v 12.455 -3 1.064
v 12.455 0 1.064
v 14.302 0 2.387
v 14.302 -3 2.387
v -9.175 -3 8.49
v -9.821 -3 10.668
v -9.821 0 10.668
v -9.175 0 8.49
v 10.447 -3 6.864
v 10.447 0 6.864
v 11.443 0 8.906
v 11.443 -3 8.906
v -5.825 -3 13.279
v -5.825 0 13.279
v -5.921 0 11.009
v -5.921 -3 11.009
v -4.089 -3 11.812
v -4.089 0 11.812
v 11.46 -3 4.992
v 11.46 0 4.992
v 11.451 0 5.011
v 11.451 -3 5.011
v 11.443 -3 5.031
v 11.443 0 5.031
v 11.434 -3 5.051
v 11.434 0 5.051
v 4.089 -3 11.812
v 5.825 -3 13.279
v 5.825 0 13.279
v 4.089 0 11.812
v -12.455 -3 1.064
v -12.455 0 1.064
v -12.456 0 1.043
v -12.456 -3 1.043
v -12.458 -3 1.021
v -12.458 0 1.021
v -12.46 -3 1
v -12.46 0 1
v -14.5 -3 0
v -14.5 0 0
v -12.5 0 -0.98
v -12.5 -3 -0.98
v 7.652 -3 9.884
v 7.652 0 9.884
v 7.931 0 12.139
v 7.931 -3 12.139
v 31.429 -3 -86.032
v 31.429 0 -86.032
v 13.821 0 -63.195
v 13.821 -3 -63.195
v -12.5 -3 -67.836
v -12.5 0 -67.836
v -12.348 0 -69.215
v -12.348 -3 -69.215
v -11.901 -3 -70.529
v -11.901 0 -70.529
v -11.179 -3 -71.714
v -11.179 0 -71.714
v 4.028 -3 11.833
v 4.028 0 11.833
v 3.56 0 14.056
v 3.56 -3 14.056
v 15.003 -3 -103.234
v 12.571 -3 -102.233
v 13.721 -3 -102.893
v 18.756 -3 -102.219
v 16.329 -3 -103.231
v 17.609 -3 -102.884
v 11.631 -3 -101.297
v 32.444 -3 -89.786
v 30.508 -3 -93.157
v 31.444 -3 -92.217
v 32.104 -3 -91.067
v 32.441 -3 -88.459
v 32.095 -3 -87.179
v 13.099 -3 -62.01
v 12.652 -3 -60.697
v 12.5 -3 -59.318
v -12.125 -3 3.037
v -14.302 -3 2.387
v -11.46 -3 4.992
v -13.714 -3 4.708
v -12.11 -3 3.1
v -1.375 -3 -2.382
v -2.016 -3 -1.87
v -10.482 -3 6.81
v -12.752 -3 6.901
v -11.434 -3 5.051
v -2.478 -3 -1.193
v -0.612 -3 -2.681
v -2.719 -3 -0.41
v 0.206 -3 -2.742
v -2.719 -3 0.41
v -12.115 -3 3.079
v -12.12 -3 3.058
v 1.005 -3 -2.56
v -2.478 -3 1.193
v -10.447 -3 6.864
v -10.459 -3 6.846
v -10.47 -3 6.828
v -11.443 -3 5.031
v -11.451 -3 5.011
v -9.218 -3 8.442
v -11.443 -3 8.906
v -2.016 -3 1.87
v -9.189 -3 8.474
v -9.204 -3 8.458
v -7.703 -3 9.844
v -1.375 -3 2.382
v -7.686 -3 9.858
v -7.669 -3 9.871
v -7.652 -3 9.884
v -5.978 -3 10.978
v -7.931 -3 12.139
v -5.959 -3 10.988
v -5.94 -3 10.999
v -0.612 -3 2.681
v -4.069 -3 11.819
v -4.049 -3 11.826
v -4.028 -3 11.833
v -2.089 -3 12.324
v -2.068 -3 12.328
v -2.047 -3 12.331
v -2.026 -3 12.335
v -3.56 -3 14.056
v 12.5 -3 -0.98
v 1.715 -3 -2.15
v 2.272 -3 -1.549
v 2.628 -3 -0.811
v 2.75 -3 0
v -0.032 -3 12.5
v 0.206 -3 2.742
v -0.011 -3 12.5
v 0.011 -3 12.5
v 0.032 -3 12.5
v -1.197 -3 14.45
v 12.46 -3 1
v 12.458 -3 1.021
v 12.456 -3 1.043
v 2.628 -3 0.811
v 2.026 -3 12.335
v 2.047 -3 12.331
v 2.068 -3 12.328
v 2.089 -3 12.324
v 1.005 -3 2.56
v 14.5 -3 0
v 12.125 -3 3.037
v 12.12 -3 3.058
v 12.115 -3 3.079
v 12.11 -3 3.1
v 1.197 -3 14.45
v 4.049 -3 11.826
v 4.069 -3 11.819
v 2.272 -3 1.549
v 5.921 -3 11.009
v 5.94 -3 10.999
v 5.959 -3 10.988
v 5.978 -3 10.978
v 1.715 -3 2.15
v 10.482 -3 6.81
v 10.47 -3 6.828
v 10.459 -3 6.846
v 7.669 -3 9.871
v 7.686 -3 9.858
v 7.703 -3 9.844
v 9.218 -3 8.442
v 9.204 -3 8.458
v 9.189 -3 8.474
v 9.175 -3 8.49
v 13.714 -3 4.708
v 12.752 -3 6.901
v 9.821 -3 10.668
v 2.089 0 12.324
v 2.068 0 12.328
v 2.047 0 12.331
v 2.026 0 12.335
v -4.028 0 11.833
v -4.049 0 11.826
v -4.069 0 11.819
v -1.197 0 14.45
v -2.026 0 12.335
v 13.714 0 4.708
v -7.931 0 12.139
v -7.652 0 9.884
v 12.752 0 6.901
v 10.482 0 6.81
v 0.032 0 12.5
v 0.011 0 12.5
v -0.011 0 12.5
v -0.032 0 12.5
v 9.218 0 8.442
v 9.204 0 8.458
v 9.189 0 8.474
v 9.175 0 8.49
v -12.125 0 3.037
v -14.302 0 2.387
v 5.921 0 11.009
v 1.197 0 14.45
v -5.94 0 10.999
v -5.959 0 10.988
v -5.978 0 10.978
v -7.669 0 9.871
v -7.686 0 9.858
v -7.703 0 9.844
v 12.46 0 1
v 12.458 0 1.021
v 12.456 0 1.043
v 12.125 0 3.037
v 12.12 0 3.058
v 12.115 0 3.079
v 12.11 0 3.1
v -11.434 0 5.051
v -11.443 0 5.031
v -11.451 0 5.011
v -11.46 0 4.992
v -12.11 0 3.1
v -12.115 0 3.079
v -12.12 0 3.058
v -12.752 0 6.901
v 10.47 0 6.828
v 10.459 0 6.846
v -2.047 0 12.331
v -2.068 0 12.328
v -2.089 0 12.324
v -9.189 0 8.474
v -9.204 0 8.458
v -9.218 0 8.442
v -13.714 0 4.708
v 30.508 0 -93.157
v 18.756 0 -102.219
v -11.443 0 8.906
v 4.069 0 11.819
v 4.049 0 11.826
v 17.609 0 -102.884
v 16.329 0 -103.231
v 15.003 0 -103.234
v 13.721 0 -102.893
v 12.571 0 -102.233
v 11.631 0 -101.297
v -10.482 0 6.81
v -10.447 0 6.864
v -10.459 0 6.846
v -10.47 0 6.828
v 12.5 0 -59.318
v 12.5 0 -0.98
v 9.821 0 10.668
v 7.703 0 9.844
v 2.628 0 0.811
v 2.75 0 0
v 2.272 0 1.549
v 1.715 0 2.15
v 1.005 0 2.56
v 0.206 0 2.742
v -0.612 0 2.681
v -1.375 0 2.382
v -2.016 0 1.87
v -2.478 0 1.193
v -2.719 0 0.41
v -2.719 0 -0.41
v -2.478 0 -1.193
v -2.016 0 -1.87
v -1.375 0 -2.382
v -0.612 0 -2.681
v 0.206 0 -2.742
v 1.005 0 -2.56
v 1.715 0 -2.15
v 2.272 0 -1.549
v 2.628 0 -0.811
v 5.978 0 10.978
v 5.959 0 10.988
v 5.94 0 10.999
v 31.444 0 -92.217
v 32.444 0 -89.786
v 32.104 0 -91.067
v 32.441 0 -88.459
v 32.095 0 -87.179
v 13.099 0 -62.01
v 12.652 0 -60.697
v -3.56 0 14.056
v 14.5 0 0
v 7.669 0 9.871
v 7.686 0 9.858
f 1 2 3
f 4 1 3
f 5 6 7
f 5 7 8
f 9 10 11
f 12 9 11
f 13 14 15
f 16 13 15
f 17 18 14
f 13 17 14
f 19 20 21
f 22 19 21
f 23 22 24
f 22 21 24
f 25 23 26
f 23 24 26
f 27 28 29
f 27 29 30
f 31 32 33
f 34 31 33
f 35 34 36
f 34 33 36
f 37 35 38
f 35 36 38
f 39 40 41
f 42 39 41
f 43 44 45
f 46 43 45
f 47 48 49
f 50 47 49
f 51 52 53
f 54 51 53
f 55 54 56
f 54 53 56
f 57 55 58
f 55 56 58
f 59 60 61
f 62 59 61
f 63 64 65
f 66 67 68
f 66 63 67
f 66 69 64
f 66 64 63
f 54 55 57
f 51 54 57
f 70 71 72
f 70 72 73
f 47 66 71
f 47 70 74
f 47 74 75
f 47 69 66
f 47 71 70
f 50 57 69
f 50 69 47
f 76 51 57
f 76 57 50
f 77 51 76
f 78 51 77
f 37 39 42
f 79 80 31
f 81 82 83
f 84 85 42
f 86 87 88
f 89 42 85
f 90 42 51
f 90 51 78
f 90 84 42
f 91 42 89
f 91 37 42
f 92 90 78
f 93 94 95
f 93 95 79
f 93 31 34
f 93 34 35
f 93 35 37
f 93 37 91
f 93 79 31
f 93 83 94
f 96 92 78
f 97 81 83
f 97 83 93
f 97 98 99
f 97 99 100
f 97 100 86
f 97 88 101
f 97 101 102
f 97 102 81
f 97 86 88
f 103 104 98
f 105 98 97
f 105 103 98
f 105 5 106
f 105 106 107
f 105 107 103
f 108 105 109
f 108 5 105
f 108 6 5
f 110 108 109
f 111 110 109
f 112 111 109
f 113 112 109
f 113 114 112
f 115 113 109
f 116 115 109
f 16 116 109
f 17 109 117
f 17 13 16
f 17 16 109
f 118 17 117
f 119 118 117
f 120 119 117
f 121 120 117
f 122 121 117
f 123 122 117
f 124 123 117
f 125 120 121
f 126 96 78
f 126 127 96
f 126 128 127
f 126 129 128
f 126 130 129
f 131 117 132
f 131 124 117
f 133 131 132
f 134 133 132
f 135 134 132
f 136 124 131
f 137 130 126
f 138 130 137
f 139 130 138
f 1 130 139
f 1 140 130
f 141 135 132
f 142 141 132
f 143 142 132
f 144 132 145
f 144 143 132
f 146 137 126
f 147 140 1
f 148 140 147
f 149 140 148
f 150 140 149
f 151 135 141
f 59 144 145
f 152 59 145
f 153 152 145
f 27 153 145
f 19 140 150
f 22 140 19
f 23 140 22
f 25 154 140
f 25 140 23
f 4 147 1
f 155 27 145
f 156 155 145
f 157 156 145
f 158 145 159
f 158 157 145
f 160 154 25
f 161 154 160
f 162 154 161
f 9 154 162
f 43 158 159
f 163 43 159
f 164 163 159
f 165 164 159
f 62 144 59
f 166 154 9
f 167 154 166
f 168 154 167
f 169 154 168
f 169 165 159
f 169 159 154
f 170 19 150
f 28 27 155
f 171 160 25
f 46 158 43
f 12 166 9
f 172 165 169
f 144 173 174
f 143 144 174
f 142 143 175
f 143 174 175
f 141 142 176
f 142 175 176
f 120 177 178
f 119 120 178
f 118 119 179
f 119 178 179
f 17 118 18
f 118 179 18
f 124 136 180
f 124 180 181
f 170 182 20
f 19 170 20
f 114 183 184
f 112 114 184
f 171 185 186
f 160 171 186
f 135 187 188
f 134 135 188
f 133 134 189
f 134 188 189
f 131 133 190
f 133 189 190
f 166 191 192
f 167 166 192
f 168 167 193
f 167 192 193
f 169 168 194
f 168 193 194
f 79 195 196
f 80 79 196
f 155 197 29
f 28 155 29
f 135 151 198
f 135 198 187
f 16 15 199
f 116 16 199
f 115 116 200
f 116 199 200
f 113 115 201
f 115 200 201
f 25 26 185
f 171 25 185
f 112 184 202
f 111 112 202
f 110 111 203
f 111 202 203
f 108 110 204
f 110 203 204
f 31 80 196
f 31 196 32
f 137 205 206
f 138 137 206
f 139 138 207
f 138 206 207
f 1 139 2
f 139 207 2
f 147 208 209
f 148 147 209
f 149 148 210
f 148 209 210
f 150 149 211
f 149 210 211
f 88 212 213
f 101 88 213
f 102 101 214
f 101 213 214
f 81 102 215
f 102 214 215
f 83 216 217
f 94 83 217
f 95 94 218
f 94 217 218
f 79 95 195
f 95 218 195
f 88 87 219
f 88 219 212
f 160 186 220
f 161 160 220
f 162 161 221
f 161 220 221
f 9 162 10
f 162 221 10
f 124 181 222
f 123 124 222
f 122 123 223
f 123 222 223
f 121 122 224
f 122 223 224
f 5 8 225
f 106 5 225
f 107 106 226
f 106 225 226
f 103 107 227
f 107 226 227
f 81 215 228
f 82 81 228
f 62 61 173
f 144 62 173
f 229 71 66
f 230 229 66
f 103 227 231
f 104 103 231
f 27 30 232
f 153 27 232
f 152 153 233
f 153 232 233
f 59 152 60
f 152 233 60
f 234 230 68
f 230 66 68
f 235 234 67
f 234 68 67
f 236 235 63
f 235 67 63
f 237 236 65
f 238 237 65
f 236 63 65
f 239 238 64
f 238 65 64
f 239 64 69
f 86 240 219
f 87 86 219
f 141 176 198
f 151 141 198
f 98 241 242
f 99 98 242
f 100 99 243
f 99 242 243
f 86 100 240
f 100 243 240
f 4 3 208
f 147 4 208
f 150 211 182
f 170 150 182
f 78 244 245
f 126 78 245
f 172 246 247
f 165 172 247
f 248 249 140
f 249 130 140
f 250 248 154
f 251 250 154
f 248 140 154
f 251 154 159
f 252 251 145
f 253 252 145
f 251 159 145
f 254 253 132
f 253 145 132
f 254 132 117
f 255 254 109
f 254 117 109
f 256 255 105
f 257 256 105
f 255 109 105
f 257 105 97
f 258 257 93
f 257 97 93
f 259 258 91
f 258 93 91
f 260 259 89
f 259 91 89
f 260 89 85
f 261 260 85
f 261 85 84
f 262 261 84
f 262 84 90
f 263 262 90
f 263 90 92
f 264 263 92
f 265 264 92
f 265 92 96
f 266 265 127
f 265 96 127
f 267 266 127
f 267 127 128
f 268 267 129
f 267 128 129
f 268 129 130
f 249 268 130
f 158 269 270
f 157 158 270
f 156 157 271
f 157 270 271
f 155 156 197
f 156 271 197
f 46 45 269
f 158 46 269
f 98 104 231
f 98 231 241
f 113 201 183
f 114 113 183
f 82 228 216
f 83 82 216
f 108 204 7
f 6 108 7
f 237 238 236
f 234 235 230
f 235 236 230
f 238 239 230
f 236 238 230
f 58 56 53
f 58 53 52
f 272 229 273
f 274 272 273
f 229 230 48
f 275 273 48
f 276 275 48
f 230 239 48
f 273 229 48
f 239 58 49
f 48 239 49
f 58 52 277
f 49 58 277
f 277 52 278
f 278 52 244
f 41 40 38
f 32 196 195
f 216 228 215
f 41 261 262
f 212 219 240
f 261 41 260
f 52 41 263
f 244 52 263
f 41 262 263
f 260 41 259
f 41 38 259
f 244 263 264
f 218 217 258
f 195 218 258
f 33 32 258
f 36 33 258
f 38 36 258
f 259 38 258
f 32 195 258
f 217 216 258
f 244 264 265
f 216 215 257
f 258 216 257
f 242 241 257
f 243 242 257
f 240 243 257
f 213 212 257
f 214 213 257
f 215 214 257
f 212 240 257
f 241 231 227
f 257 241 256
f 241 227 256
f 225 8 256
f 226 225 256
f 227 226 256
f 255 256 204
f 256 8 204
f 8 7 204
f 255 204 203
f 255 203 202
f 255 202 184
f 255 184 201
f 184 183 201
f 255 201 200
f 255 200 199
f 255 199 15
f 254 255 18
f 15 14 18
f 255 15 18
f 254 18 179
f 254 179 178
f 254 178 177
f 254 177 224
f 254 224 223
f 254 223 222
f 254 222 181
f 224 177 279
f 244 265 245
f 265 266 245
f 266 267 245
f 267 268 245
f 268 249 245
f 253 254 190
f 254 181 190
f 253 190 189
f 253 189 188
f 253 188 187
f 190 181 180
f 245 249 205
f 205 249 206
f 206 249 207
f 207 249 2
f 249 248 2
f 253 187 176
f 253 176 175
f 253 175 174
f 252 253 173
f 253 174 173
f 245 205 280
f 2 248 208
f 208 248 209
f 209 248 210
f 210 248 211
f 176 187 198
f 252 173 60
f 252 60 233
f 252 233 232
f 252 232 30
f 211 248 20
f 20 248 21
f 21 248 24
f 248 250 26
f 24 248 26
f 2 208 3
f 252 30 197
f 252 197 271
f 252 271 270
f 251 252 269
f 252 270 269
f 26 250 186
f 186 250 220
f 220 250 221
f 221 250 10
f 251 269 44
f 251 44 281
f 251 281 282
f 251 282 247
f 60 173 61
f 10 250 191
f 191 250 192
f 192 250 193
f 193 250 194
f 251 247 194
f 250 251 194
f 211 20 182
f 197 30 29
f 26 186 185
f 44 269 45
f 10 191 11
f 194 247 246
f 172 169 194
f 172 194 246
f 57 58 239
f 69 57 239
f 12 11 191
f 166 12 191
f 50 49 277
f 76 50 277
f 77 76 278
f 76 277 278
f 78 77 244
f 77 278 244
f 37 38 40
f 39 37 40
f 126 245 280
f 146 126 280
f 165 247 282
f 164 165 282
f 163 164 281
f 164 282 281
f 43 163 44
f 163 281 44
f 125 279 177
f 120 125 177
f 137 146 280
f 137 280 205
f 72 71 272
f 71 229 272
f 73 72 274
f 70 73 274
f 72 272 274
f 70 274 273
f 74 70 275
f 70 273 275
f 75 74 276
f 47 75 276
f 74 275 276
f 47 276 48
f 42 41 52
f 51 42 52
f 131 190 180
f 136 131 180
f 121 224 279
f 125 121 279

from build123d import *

# Parameters (mm, degrees)
F0_R     = 1.5
F1_DEPTH = 3
F3_R     = 2.75
F4_DEPTH = 381
F6_DEPTH = 381
F7_R     = 5.08
F8_R     = 5.08


with BuildPart() as f1:
    # F0 (on Front) → F1 (new body)
    with BuildSketch(Plane.XZ):
        with BuildLine():
            ThreePointArc((12.4599357944, -1), (12.4899799325, -0.5004011242), (12.5, 0))
            ThreePointArc((12.5, 0), (12.4899799325, 0.5004011242), (12.4599357944, 1))
            Line((12.4599357944, 1), (12.4599357944, -1))
        make_face()
        with BuildLine():
            Line((12.5, -0.9803613016), (12.5, 0))
            ThreePointArc((12.5, 0), (12.4899799325, -0.5004011242), (12.4599357944, -1))
            Line((12.4599357944, -1), (12.5, -0.9803613016))
        make_face()
        Polygon((14.5, 0), (12.5, 0), (12.5, -0.9803613016), align=None)
        with BuildLine():
            ThreePointArc((12.4599357944, 1), (12.4899799325, 0.5004011242), (12.5, 0))
            Line((12.5, 0), (14.5, 0))
            Line((14.5, 0), (12.4599357944, 1))
        make_face()
        with BuildLine():
            Line((12.4599357944, -1), (12.4599357944, 1))
            ThreePointArc((12.4599357944, 1), (12.4573061626, 1.0322418184), (12.4545931007, 1.0644767236))
            Line((12.4545931007, 1.0644767236), (12.1254039202, 3.0371993304))
            ThreePointArc((12.1254039202, 3.0371993304), (12.1175033242, 3.0685685893), (12.109521574, 3.0999172971))
            Line((12.109521574, 3.0999172971), (11.4601226356, 4.9915517805))
            ThreePointArc((11.4601226356, 4.9915517805), (11.4471665832, 5.0211928082), (11.4341338659, 5.0508002075))
            Line((11.4341338659, 5.0508002075), (10.4822390798, 6.8097477099))
            ThreePointArc((10.4822390798, 6.8097477099), (10.4645809783, 6.8368519765), (10.4468527925, 6.8639104548))
            Line((10.4468527925, 6.8639104548), (9.2184273671, 8.4421914736))
            ThreePointArc((9.2184273671, 8.4421914736), (9.1965488834, 8.4660196453), (9.1746088078, 8.4897911177))
            Line((9.1746088078, 8.4897911177), (7.7031609865, 9.844354261))
            ThreePointArc((7.7031609865, 9.844354261), (7.6776589086, 9.8642563675), (7.6521054113, 9.8840924102))
            Line((7.6521054113, 9.8840924102), (5.9777724548, 10.9779887265))
            ThreePointArc((5.9777724548, 10.9779887265), (5.949342413, 10.9934218901), (5.9208725267, 11.0087814277))
            Line((5.9208725267, 11.0087814277), (4.0893258734, 11.812172277))
            ThreePointArc((4.0893258734, 11.812172277), (4.0587433651, 11.8227155213), (4.0281336742, 11.8331795855))
            Line((4.0281336742, 11.8331795855), (2.0893331423, 12.3241505598))
            ThreePointArc((2.0893331423, 12.3241505598), (2.0574323785, 12.3295162925), (2.0255178355, 12.3347994511))
            Line((2.0255178355, 12.3347994511), (0.0323488495, 12.499958142))
            ThreePointArc((0.0323488495, 12.499958142), (0, 12.5), (-0.0323488495, 12.499958142))
            Line((-0.0323488495, 12.499958142), (-2.0255178355, 12.3347994511))
            ThreePointArc((-2.0255178355, 12.3347994511), (-2.0574323785, 12.3295162925), (-2.0893331423, 12.3241505598))
            Line((-2.0893331423, 12.3241505598), (-4.0281336742, 11.8331795855))
            ThreePointArc((-4.0281336742, 11.8331795855), (-4.0587433651, 11.8227155213), (-4.0893258734, 11.812172277))
            Line((-4.0893258734, 11.812172277), (-5.9208725267, 11.0087814277))
            ThreePointArc((-5.9208725267, 11.0087814277), (-5.949342413, 10.9934218901), (-5.9777724548, 10.9779887265))
            Line((-5.9777724548, 10.9779887265), (-7.6521054113, 9.8840924102))
            ThreePointArc((-7.6521054113, 9.8840924102), (-7.6776589086, 9.8642563675), (-7.7031609865, 9.844354261))
            Line((-7.7031609865, 9.844354261), (-9.1746088078, 8.4897911177))
            ThreePointArc((-9.1746088078, 8.4897911177), (-9.1965488834, 8.4660196453), (-9.2184273671, 8.4421914736))
            Line((-9.2184273671, 8.4421914736), (-10.4468527925, 6.8639104548))
            ThreePointArc((-10.4468527925, 6.8639104548), (-10.4645809783, 6.8368519765), (-10.4822390798, 6.8097477099))
            Line((-10.4822390798, 6.8097477099), (-11.4341338659, 5.0508002075))
            ThreePointArc((-11.4341338659, 5.0508002075), (-11.4471665832, 5.0211928082), (-11.4601226356, 4.9915517805))
            Line((-11.4601226356, 4.9915517805), (-12.109521574, 3.0999172971))
            ThreePointArc((-12.109521574, 3.0999172971), (-12.1175033242, 3.0685685893), (-12.1254039202, 3.0371993304))
            Line((-12.1254039202, 3.0371993304), (-12.4545931007, 1.0644767236))
            ThreePointArc((-12.4545931007, 1.0644767236), (-12.4573061626, 1.0322418184), (-12.4599357944, 1))
            Line((-12.4599357944, 1), (-12.4599357944, -1))
            ThreePointArc((-12.4599357944, -1), (0, -12.5), (12.4599357944, -1))
        make_face()
        Circle(F0_R, mode=Mode.SUBTRACT)
        with BuildLine():
            Line((12.5, -0.9803613016), (12.4599357944, -1))
            ThreePointArc((12.4599357944, -1), (0, -12.5), (-12.4599357944, -1))
            Line((-12.4599357944, -1), (-12.5, -0.9803613016))
            Line((-12.5, -0.9803613016), (-12.5, -67.8362422814))
            ThreePointArc((-12.5, -67.8362422814), (-12.1606330639, -69.8843609721), (-11.1788062454, -71.7135619415))
            Line((-11.1788062454, -71.7135619415), (26.3647868293, -120.4068531523))
            ThreePointArc((26.3647868293, -120.4068531523), (30.5793691017, -122.827115514), (35.2709127347, -121.5583397375))
            Line((35.2709127347, -121.5583397375), (45.0117500289, -114.0479410258))
            ThreePointArc((45.0117500289, -114.0479410258), (47.4320123906, -109.8333587534), (46.1632366141, -105.1418151204))
            Line((46.1632366141, -105.1418151204), (13.8211937546, -63.194830766))
            ThreePointArc((13.8211937546, -63.194830766), (12.8393669361, -61.3656297965), (12.5, -59.3175111059))
            Line((12.5, -59.3175111059), (12.5, -0.9803613016))
        make_face()
        with BuildLine():
            Line((12.1254039202, 3.0371993304), (12.4545931007, 1.0644767236))
            ThreePointArc((12.4545931007, 1.0644767236), (12.4019962037, 1.5622068245), (12.3295162925, 2.0574323785))
            ThreePointArc((12.3295162925, 2.0574323785), (12.2372695677, 2.5493594347), (12.1254039202, 3.0371993304))
        make_face()
        with BuildLine():
            ThreePointArc((12.3295162925, 2.0574323785), (12.4019962037, 1.5622068245), (12.4545931007, 1.0644767236))
            Line((12.4545931007, 1.0644767236), (14.3022388993, 2.3866215591))
            Line((14.3022388993, 2.3866215591), (12.3295162925, 2.0574323785))
        make_face()
        with BuildLine():
            Line((-12.5, -0.9803613016), (-12.4599357944, -1))
            ThreePointArc((-12.4599357944, -1), (-12.4899799325, -0.5004011242), (-12.5, 0))
            Line((-12.5, 0), (-12.5, -0.9803613016))
        make_face()
        with BuildLine():
            ThreePointArc((-12.5, 0), (-12.4899799325, -0.5004011242), (-12.4599357944, -1))
            Line((-12.4599357944, -1), (-12.4599357944, 1))
            ThreePointArc((-12.4599357944, 1), (-12.4899799325, 0.5004011242), (-12.5, 0))
        make_face()
        with BuildLine():
            ThreePointArc((12.1254039202, 3.0371993304), (12.2372695677, 2.5493594347), (12.3295162925, 2.0574323785))
            Line((12.3295162925, 2.0574323785), (14.3022388993, 2.3866215591))
            Line((14.3022388993, 2.3866215591), (12.1254039202, 3.0371993304))
        make_face()
        with BuildLine():
            Line((-14.5, 0), (-12.5, 0))
            ThreePointArc((-12.5, 0), (-12.4899799325, 0.5004011242), (-12.4599357944, 1))
            Line((-12.4599357944, 1), (-14.5, 0))
        make_face()
        Polygon((-12.5, -0.9803613016), (-12.5, 0), (-14.5, 0), align=None)
        with BuildLine():
            Line((11.4601226356, 4.9915517805), (12.109521574, 3.0999172971))
            ThreePointArc((12.109521574, 3.0999172971), (11.9757183481, 3.5822018434), (11.8227155213, 4.0587433651))
            ThreePointArc((11.8227155213, 4.0587433651), (11.6507583892, 4.5287778655), (11.4601226356, 4.9915517805))
        make_face()
        with BuildLine():
            ThreePointArc((11.8227155213, 4.0587433651), (11.9757183481, 3.5822018434), (12.109521574, 3.0999172971))
            Line((12.109521574, 3.0999172971), (13.7143500047, 4.7081423035))
            Line((13.7143500047, 4.7081423035), (11.8227155213, 4.0587433651))
        make_face()
        with BuildLine():
            Line((-14.3022388993, 2.3866215591), (-12.4545931007, 1.0644767236))
            ThreePointArc((-12.4545931007, 1.0644767236), (-12.4019962037, 1.5622068245), (-12.3295162925, 2.0574323785))
            Line((-12.3295162925, 2.0574323785), (-14.3022388993, 2.3866215591))
        make_face()
        with BuildLine():
            ThreePointArc((-12.3295162925, 2.0574323785), (-12.4019962037, 1.5622068245), (-12.4545931007, 1.0644767236))
            Line((-12.4545931007, 1.0644767236), (-12.1254039202, 3.0371993304))
            ThreePointArc((-12.1254039202, 3.0371993304), (-12.2372695677, 2.5493594347), (-12.3295162925, 2.0574323785))
        make_face()
        with BuildLine():
            ThreePointArc((11.4601226356, 4.9915517805), (11.6507583892, 4.5287778655), (11.8227155213, 4.0587433651))
            Line((11.8227155213, 4.0587433651), (13.7143500047, 4.7081423035))
            Line((13.7143500047, 4.7081423035), (11.4601226356, 4.9915517805))
        make_face()
        with BuildLine():
            Line((-14.3022388993, 2.3866215591), (-12.3295162925, 2.0574323785))
            ThreePointArc((-12.3295162925, 2.0574323785), (-12.2372695677, 2.5493594347), (-12.1254039202, 3.0371993304))
            Line((-12.1254039202, 3.0371993304), (-14.3022388993, 2.3866215591))
        make_face()
        with BuildLine():
            Line((10.4822390798, 6.8097477099), (11.4341338659, 5.0508002075))
            ThreePointArc((11.4341338659, 5.0508002075), (11.2227741143, 5.5044837341), (10.9934218901, 5.949342413))
            ThreePointArc((10.9934218901, 5.949342413), (10.7464448932, 6.3846630418), (10.4822390798, 6.8097477099))
        make_face()
        with BuildLine():
            ThreePointArc((10.9934218901, 5.949342413), (11.2227741143, 5.5044837341), (11.4341338659, 5.0508002075))
            Line((11.4341338659, 5.0508002075), (12.7523693925, 6.901237199))
            Line((12.7523693925, 6.901237199), (10.9934218901, 5.949342413))
        make_face()
        with BuildLine():
            Line((-13.7143500047, 4.7081423035), (-12.109521574, 3.0999172971))
            ThreePointArc((-12.109521574, 3.0999172971), (-11.9757183481, 3.5822018434), (-11.8227155213, 4.0587433651))
            Line((-11.8227155213, 4.0587433651), (-13.7143500047, 4.7081423035))
        make_face()
        with BuildLine():
            ThreePointArc((-11.8227155213, 4.0587433651), (-11.9757183481, 3.5822018434), (-12.109521574, 3.0999172971))
            Line((-12.109521574, 3.0999172971), (-11.4601226356, 4.9915517805))
            ThreePointArc((-11.4601226356, 4.9915517805), (-11.6507583892, 4.5287778655), (-11.8227155213, 4.0587433651))
        make_face()
        with BuildLine():
            ThreePointArc((10.4822390798, 6.8097477099), (10.7464448932, 6.3846630418), (10.9934218901, 5.949342413))
            Line((10.9934218901, 5.949342413), (12.7523693925, 6.901237199))
            Line((12.7523693925, 6.901237199), (10.4822390798, 6.8097477099))
        make_face()
        with BuildLine():
            Line((-13.7143500047, 4.7081423035), (-11.8227155213, 4.0587433651))
            ThreePointArc((-11.8227155213, 4.0587433651), (-11.6507583892, 4.5287778655), (-11.4601226356, 4.9915517805))
            Line((-11.4601226356, 4.9915517805), (-13.7143500047, 4.7081423035))
        make_face()
        with BuildLine():
            Line((9.2184273671, 8.4421914736), (10.4468527925, 6.8639104548))
            ThreePointArc((10.4468527925, 6.8639104548), (10.1637018583, 7.2766176577), (9.8642563675, 7.6776589086))
            ThreePointArc((9.8642563675, 7.6776589086), (9.5489963943, 8.0663912539), (9.2184273671, 8.4421914736))
        make_face()
        with BuildLine():
            ThreePointArc((9.8642563675, 7.6776589086), (10.1637018583, 7.2766176577), (10.4468527925, 6.8639104548))
            Line((10.4468527925, 6.8639104548), (11.4425373862, 8.906084334))
            Line((11.4425373862, 8.906084334), (9.8642563675, 7.6776589086))
        make_face()
        with BuildLine():
            Line((-12.7523693925, 6.901237199), (-11.4341338659, 5.0508002075))
            ThreePointArc((-11.4341338659, 5.0508002075), (-11.2227741143, 5.5044837341), (-10.9934218901, 5.949342413))
            Line((-10.9934218901, 5.949342413), (-12.7523693925, 6.901237199))
        make_face()
        with BuildLine():
            ThreePointArc((-10.9934218901, 5.949342413), (-11.2227741143, 5.5044837341), (-11.4341338659, 5.0508002075))
            Line((-11.4341338659, 5.0508002075), (-10.4822390798, 6.8097477099))
            ThreePointArc((-10.4822390798, 6.8097477099), (-10.7464448932, 6.3846630418), (-10.9934218901, 5.949342413))
        make_face()
        with BuildLine():
            ThreePointArc((9.2184273671, 8.4421914736), (9.5489963943, 8.0663912539), (9.8642563675, 7.6776589086))
            Line((9.8642563675, 7.6776589086), (11.4425373862, 8.906084334))
            Line((11.4425373862, 8.906084334), (9.2184273671, 8.4421914736))
        make_face()
        with BuildLine():
            Line((-12.7523693925, 6.901237199), (-10.9934218901, 5.949342413))
            ThreePointArc((-10.9934218901, 5.949342413), (-10.7464448932, 6.3846630418), (-10.4822390798, 6.8097477099))
            Line((-10.4822390798, 6.8097477099), (-12.7523693925, 6.901237199))
        make_face()
        with BuildLine():
            Line((7.7031609865, 9.844354261), (9.1746088078, 8.4897911177))
            ThreePointArc((9.1746088078, 8.4897911177), (8.8273903103, 8.8502644203), (8.4660196453, 9.1965488834))
            ThreePointArc((8.4660196453, 9.1965488834), (8.0910761662, 9.5280893401), (7.7031609865, 9.844354261))
        make_face()
        with BuildLine():
            ThreePointArc((8.4660196453, 9.1965488834), (8.8273903103, 8.8502644203), (9.1746088078, 8.4897911177))
            Line((9.1746088078, 8.4897911177), (9.8205827886, 10.6679967048))
            Line((9.8205827886, 10.6679967048), (8.4660196453, 9.1965488834))
        make_face()
        with BuildLine():
            Line((-11.4425373862, 8.906084334), (-10.4468527925, 6.8639104548))
            ThreePointArc((-10.4468527925, 6.8639104548), (-10.1637018583, 7.2766176577), (-9.8642563675, 7.6776589086))
            Line((-9.8642563675, 7.6776589086), (-11.4425373862, 8.906084334))
        make_face()
        with BuildLine():
            ThreePointArc((-9.8642563675, 7.6776589086), (-10.1637018583, 7.2766176577), (-10.4468527925, 6.8639104548))
            Line((-10.4468527925, 6.8639104548), (-9.2184273671, 8.4421914736))
            ThreePointArc((-9.2184273671, 8.4421914736), (-9.5489963943, 8.0663912539), (-9.8642563675, 7.6776589086))
        make_face()
        with BuildLine():
            ThreePointArc((7.7031609865, 9.844354261), (8.0910761662, 9.5280893401), (8.4660196453, 9.1965488834))
            Line((8.4660196453, 9.1965488834), (9.8205827886, 10.6679967048))
            Line((9.8205827886, 10.6679967048), (7.7031609865, 9.844354261))
        make_face()
        with BuildLine():
            Line((-11.4425373862, 8.906084334), (-9.8642563675, 7.6776589086))
            ThreePointArc((-9.8642563675, 7.6776589086), (-9.5489963943, 8.0663912539), (-9.2184273671, 8.4421914736))
            Line((-9.2184273671, 8.4421914736), (-11.4425373862, 8.906084334))
        make_face()
        with BuildLine():
            Line((5.9777724548, 10.9779887265), (7.6521054113, 9.8840924102))
            ThreePointArc((7.6521054113, 9.8840924102), (7.250290566, 10.1824990405), (6.8368519765, 10.4645809783))
            ThreePointArc((6.8368519765, 10.4645809783), (6.4124524722, 10.7298859869), (5.9777724548, 10.9779887265))
        make_face()
        with BuildLine():
            ThreePointArc((6.8368519765, 10.4645809783), (7.250290566, 10.1824990405), (7.6521054113, 9.8840924102))
            Line((7.6521054113, 9.8840924102), (7.9307482928, 12.1389139348))
            Line((7.9307482928, 12.1389139348), (6.8368519765, 10.4645809783))
        make_face()
        with BuildLine():
            Line((-9.8205827886, 10.6679967048), (-9.1746088078, 8.4897911177))
            ThreePointArc((-9.1746088078, 8.4897911177), (-8.8273903103, 8.8502644203), (-8.4660196453, 9.1965488834))
            Line((-8.4660196453, 9.1965488834), (-9.8205827886, 10.6679967048))
        make_face()
        with BuildLine():
            ThreePointArc((-8.4660196453, 9.1965488834), (-8.8273903103, 8.8502644203), (-9.1746088078, 8.4897911177))
            Line((-9.1746088078, 8.4897911177), (-7.7031609865, 9.844354261))
            ThreePointArc((-7.7031609865, 9.844354261), (-8.0910761662, 9.5280893401), (-8.4660196453, 9.1965488834))
        make_face()
        with BuildLine():
            ThreePointArc((5.9777724548, 10.9779887265), (6.4124524722, 10.7298859869), (6.8368519765, 10.4645809783))
            Line((6.8368519765, 10.4645809783), (7.9307482928, 12.1389139348))
            Line((7.9307482928, 12.1389139348), (5.9777724548, 10.9779887265))
        make_face()
        with BuildLine():
            Line((-9.8205827886, 10.6679967048), (-8.4660196453, 9.1965488834))
            ThreePointArc((-8.4660196453, 9.1965488834), (-8.0910761662, 9.5280893401), (-7.7031609865, 9.844354261))
            Line((-7.7031609865, 9.844354261), (-9.8205827886, 10.6679967048))
        make_face()
        with BuildLine():
            Line((4.0893258734, 11.812172277), (5.9208725267, 11.0087814277))
            ThreePointArc((5.9208725267, 11.0087814277), (5.4754217951, 11.2369816306), (5.0211928082, 11.4471665832))
            ThreePointArc((5.0211928082, 11.4471665832), (4.5589137907, 11.6389993148), (4.0893258734, 11.812172277))
        make_face()
        with BuildLine():
            ThreePointArc((5.0211928082, 11.4471665832), (5.4754217951, 11.2369816306), (5.9208725267, 11.0087814277))
            Line((5.9208725267, 11.0087814277), (5.8245836575, 13.2787132365))
            Line((5.8245836575, 13.2787132365), (5.0211928082, 11.4471665832))
        make_face()
        with BuildLine():
            Line((-7.9307482928, 12.1389139348), (-7.6521054113, 9.8840924102))
            ThreePointArc((-7.6521054113, 9.8840924102), (-7.250290566, 10.1824990405), (-6.8368519765, 10.4645809783))
            Line((-6.8368519765, 10.4645809783), (-7.9307482928, 12.1389139348))
        make_face()
        with BuildLine():
            ThreePointArc((-6.8368519765, 10.4645809783), (-7.250290566, 10.1824990405), (-7.6521054113, 9.8840924102))
            Line((-7.6521054113, 9.8840924102), (-5.9777724548, 10.9779887265))
            ThreePointArc((-5.9777724548, 10.9779887265), (-6.4124524722, 10.7298859869), (-6.8368519765, 10.4645809783))
        make_face()
        with BuildLine():
            ThreePointArc((4.0893258734, 11.812172277), (4.5589137907, 11.6389993148), (5.0211928082, 11.4471665832))
            Line((5.0211928082, 11.4471665832), (5.8245836575, 13.2787132365))
            Line((5.8245836575, 13.2787132365), (4.0893258734, 11.812172277))
        make_face()
        with BuildLine():
            Line((-7.9307482928, 12.1389139348), (-6.8368519765, 10.4645809783))
            ThreePointArc((-6.8368519765, 10.4645809783), (-6.4124524722, 10.7298859869), (-5.9777724548, 10.9779887265))
            Line((-5.9777724548, 10.9779887265), (-7.9307482928, 12.1389139348))
        make_face()
        with BuildLine():
            Line((2.0893331423, 12.3241505598), (4.0281336742, 11.8331795855))
            ThreePointArc((4.0281336742, 11.8331795855), (3.551197791, 11.9849486544), (3.0685685893, 12.1175033242))
            ThreePointArc((3.0685685893, 12.1175033242), (2.5810198252, 12.2306310819), (2.0893331423, 12.3241505598))
        make_face()
        with BuildLine():
            ThreePointArc((3.0685685893, 12.1175033242), (3.551197791, 11.9849486544), (4.0281336742, 11.8331795855))
            Line((4.0281336742, 11.8331795855), (3.5595395635, 14.0563038561))
            Line((3.5595395635, 14.0563038561), (3.0685685893, 12.1175033242))
        make_face()
        with BuildLine():
            Line((-5.8245836575, 13.2787132365), (-5.9208725267, 11.0087814277))
            ThreePointArc((-5.9208725267, 11.0087814277), (-5.4754217951, 11.2369816306), (-5.0211928082, 11.4471665832))
            Line((-5.0211928082, 11.4471665832), (-5.8245836575, 13.2787132365))
        make_face()
        with BuildLine():
            ThreePointArc((-5.0211928082, 11.4471665832), (-5.4754217951, 11.2369816306), (-5.9208725267, 11.0087814277))
            Line((-5.9208725267, 11.0087814277), (-4.0893258734, 11.812172277))
            ThreePointArc((-4.0893258734, 11.812172277), (-4.5589137907, 11.6389993148), (-5.0211928082, 11.4471665832))
        make_face()
        with BuildLine():
            ThreePointArc((2.0893331423, 12.3241505598), (2.5810198252, 12.2306310819), (3.0685685893, 12.1175033242))
            Line((3.0685685893, 12.1175033242), (3.5595395635, 14.0563038561))
            Line((3.5595395635, 14.0563038561), (2.0893331423, 12.3241505598))
        make_face()
        with BuildLine():
            Line((-5.8245836575, 13.2787132365), (-5.0211928082, 11.4471665832))
            ThreePointArc((-5.0211928082, 11.4471665832), (-4.5589137907, 11.6389993148), (-4.0893258734, 11.812172277))
            Line((-4.0893258734, 11.812172277), (-5.8245836575, 13.2787132365))
        make_face()
        with BuildLine():
            Line((0.0323488495, 12.499958142), (2.0255178355, 12.3347994511))
            ThreePointArc((2.0255178355, 12.3347994511), (1.5301063685, 12.4059975214), (1.0322418184, 12.4573061626))
            ThreePointArc((1.0322418184, 12.4573061626), (0.5327223671, 12.488643116), (0.0323488495, 12.499958142))
        make_face()
        with BuildLine():
            ThreePointArc((1.0322418184, 12.4573061626), (1.5301063685, 12.4059975214), (2.0255178355, 12.3347994511))
            Line((2.0255178355, 12.3347994511), (1.1974005093, 14.4504751486))
            Line((1.1974005093, 14.4504751486), (1.0322418184, 12.4573061626))
        make_face()
        with BuildLine():
            Line((-3.5595395635, 14.0563038561), (-4.0281336742, 11.8331795855))
            ThreePointArc((-4.0281336742, 11.8331795855), (-3.551197791, 11.9849486544), (-3.0685685893, 12.1175033242))
            Line((-3.0685685893, 12.1175033242), (-3.5595395635, 14.0563038561))
        make_face()
        with BuildLine():
            ThreePointArc((-3.0685685893, 12.1175033242), (-3.551197791, 11.9849486544), (-4.0281336742, 11.8331795855))
            Line((-4.0281336742, 11.8331795855), (-2.0893331423, 12.3241505598))
            ThreePointArc((-2.0893331423, 12.3241505598), (-2.5810198252, 12.2306310819), (-3.0685685893, 12.1175033242))
        make_face()
        with BuildLine():
            ThreePointArc((0.0323488495, 12.499958142), (0.5327223671, 12.488643116), (1.0322418184, 12.4573061626))
            Line((1.0322418184, 12.4573061626), (1.1974005093, 14.4504751486))
            Line((1.1974005093, 14.4504751486), (0.0323488495, 12.499958142))
        make_face()
        with BuildLine():
            Line((-3.5595395635, 14.0563038561), (-3.0685685893, 12.1175033242))
            ThreePointArc((-3.0685685893, 12.1175033242), (-2.5810198252, 12.2306310819), (-2.0893331423, 12.3241505598))
            Line((-2.0893331423, 12.3241505598), (-3.5595395635, 14.0563038561))
        make_face()
        with BuildLine():
            Line((-2.0255178355, 12.3347994511), (-0.0323488495, 12.499958142))
            ThreePointArc((-0.0323488495, 12.499958142), (-0.5327223671, 12.488643116), (-1.0322418184, 12.4573061626))
            ThreePointArc((-1.0322418184, 12.4573061626), (-1.5301063685, 12.4059975214), (-2.0255178355, 12.3347994511))
        make_face()
        with BuildLine():
            ThreePointArc((-1.0322418184, 12.4573061626), (-0.5327223671, 12.488643116), (-0.0323488495, 12.499958142))
            Line((-0.0323488495, 12.499958142), (-1.1974005093, 14.4504751486))
            Line((-1.1974005093, 14.4504751486), (-1.0322418184, 12.4573061626))
        make_face()
        with BuildLine():
            Line((-1.1974005093, 14.4504751486), (-2.0255178355, 12.3347994511))
            ThreePointArc((-2.0255178355, 12.3347994511), (-1.5301063685, 12.4059975214), (-1.0322418184, 12.4573061626))
            Line((-1.0322418184, 12.4573061626), (-1.1974005093, 14.4504751486))
        make_face()
        Circle(F0_R)
    extrude(amount=F1_DEPTH)

    # F3 (on face) → F4 (cut, symmetric)
    with BuildSketch(Plane.XZ.offset(3)):
        Circle(F3_R)
    extrude(amount=F4_DEPTH, both=True, mode=Mode.SUBTRACT)

    # F5 (on face) → F6 (cut, symmetric)
    with BuildSketch(Plane.XZ.offset(3)):
        Polygon((39.3883599903, -86.3104796004), (11.1765899037, -108.0623716928), (26.385564357, -126.6003996134), (60.5728030205, -109.7657829523), align=None)
    extrude(amount=F6_DEPTH, both=True, mode=Mode.SUBTRACT)

    # F7
    f7_edges = [f1.edges().sort_by_distance(p)[0] for p in [
        (14.732828, -1.5, -105.320434),
    ]]
    fillet(f7_edges, radius=F7_R)

    # F8
    f8_edges = [f1.edges().sort_by_distance(p)[0] for p in [
        (34.531278, -1.5, -90.055396),
    ]]
    fillet(f8_edges, radius=F8_R)


solid = f1.part
